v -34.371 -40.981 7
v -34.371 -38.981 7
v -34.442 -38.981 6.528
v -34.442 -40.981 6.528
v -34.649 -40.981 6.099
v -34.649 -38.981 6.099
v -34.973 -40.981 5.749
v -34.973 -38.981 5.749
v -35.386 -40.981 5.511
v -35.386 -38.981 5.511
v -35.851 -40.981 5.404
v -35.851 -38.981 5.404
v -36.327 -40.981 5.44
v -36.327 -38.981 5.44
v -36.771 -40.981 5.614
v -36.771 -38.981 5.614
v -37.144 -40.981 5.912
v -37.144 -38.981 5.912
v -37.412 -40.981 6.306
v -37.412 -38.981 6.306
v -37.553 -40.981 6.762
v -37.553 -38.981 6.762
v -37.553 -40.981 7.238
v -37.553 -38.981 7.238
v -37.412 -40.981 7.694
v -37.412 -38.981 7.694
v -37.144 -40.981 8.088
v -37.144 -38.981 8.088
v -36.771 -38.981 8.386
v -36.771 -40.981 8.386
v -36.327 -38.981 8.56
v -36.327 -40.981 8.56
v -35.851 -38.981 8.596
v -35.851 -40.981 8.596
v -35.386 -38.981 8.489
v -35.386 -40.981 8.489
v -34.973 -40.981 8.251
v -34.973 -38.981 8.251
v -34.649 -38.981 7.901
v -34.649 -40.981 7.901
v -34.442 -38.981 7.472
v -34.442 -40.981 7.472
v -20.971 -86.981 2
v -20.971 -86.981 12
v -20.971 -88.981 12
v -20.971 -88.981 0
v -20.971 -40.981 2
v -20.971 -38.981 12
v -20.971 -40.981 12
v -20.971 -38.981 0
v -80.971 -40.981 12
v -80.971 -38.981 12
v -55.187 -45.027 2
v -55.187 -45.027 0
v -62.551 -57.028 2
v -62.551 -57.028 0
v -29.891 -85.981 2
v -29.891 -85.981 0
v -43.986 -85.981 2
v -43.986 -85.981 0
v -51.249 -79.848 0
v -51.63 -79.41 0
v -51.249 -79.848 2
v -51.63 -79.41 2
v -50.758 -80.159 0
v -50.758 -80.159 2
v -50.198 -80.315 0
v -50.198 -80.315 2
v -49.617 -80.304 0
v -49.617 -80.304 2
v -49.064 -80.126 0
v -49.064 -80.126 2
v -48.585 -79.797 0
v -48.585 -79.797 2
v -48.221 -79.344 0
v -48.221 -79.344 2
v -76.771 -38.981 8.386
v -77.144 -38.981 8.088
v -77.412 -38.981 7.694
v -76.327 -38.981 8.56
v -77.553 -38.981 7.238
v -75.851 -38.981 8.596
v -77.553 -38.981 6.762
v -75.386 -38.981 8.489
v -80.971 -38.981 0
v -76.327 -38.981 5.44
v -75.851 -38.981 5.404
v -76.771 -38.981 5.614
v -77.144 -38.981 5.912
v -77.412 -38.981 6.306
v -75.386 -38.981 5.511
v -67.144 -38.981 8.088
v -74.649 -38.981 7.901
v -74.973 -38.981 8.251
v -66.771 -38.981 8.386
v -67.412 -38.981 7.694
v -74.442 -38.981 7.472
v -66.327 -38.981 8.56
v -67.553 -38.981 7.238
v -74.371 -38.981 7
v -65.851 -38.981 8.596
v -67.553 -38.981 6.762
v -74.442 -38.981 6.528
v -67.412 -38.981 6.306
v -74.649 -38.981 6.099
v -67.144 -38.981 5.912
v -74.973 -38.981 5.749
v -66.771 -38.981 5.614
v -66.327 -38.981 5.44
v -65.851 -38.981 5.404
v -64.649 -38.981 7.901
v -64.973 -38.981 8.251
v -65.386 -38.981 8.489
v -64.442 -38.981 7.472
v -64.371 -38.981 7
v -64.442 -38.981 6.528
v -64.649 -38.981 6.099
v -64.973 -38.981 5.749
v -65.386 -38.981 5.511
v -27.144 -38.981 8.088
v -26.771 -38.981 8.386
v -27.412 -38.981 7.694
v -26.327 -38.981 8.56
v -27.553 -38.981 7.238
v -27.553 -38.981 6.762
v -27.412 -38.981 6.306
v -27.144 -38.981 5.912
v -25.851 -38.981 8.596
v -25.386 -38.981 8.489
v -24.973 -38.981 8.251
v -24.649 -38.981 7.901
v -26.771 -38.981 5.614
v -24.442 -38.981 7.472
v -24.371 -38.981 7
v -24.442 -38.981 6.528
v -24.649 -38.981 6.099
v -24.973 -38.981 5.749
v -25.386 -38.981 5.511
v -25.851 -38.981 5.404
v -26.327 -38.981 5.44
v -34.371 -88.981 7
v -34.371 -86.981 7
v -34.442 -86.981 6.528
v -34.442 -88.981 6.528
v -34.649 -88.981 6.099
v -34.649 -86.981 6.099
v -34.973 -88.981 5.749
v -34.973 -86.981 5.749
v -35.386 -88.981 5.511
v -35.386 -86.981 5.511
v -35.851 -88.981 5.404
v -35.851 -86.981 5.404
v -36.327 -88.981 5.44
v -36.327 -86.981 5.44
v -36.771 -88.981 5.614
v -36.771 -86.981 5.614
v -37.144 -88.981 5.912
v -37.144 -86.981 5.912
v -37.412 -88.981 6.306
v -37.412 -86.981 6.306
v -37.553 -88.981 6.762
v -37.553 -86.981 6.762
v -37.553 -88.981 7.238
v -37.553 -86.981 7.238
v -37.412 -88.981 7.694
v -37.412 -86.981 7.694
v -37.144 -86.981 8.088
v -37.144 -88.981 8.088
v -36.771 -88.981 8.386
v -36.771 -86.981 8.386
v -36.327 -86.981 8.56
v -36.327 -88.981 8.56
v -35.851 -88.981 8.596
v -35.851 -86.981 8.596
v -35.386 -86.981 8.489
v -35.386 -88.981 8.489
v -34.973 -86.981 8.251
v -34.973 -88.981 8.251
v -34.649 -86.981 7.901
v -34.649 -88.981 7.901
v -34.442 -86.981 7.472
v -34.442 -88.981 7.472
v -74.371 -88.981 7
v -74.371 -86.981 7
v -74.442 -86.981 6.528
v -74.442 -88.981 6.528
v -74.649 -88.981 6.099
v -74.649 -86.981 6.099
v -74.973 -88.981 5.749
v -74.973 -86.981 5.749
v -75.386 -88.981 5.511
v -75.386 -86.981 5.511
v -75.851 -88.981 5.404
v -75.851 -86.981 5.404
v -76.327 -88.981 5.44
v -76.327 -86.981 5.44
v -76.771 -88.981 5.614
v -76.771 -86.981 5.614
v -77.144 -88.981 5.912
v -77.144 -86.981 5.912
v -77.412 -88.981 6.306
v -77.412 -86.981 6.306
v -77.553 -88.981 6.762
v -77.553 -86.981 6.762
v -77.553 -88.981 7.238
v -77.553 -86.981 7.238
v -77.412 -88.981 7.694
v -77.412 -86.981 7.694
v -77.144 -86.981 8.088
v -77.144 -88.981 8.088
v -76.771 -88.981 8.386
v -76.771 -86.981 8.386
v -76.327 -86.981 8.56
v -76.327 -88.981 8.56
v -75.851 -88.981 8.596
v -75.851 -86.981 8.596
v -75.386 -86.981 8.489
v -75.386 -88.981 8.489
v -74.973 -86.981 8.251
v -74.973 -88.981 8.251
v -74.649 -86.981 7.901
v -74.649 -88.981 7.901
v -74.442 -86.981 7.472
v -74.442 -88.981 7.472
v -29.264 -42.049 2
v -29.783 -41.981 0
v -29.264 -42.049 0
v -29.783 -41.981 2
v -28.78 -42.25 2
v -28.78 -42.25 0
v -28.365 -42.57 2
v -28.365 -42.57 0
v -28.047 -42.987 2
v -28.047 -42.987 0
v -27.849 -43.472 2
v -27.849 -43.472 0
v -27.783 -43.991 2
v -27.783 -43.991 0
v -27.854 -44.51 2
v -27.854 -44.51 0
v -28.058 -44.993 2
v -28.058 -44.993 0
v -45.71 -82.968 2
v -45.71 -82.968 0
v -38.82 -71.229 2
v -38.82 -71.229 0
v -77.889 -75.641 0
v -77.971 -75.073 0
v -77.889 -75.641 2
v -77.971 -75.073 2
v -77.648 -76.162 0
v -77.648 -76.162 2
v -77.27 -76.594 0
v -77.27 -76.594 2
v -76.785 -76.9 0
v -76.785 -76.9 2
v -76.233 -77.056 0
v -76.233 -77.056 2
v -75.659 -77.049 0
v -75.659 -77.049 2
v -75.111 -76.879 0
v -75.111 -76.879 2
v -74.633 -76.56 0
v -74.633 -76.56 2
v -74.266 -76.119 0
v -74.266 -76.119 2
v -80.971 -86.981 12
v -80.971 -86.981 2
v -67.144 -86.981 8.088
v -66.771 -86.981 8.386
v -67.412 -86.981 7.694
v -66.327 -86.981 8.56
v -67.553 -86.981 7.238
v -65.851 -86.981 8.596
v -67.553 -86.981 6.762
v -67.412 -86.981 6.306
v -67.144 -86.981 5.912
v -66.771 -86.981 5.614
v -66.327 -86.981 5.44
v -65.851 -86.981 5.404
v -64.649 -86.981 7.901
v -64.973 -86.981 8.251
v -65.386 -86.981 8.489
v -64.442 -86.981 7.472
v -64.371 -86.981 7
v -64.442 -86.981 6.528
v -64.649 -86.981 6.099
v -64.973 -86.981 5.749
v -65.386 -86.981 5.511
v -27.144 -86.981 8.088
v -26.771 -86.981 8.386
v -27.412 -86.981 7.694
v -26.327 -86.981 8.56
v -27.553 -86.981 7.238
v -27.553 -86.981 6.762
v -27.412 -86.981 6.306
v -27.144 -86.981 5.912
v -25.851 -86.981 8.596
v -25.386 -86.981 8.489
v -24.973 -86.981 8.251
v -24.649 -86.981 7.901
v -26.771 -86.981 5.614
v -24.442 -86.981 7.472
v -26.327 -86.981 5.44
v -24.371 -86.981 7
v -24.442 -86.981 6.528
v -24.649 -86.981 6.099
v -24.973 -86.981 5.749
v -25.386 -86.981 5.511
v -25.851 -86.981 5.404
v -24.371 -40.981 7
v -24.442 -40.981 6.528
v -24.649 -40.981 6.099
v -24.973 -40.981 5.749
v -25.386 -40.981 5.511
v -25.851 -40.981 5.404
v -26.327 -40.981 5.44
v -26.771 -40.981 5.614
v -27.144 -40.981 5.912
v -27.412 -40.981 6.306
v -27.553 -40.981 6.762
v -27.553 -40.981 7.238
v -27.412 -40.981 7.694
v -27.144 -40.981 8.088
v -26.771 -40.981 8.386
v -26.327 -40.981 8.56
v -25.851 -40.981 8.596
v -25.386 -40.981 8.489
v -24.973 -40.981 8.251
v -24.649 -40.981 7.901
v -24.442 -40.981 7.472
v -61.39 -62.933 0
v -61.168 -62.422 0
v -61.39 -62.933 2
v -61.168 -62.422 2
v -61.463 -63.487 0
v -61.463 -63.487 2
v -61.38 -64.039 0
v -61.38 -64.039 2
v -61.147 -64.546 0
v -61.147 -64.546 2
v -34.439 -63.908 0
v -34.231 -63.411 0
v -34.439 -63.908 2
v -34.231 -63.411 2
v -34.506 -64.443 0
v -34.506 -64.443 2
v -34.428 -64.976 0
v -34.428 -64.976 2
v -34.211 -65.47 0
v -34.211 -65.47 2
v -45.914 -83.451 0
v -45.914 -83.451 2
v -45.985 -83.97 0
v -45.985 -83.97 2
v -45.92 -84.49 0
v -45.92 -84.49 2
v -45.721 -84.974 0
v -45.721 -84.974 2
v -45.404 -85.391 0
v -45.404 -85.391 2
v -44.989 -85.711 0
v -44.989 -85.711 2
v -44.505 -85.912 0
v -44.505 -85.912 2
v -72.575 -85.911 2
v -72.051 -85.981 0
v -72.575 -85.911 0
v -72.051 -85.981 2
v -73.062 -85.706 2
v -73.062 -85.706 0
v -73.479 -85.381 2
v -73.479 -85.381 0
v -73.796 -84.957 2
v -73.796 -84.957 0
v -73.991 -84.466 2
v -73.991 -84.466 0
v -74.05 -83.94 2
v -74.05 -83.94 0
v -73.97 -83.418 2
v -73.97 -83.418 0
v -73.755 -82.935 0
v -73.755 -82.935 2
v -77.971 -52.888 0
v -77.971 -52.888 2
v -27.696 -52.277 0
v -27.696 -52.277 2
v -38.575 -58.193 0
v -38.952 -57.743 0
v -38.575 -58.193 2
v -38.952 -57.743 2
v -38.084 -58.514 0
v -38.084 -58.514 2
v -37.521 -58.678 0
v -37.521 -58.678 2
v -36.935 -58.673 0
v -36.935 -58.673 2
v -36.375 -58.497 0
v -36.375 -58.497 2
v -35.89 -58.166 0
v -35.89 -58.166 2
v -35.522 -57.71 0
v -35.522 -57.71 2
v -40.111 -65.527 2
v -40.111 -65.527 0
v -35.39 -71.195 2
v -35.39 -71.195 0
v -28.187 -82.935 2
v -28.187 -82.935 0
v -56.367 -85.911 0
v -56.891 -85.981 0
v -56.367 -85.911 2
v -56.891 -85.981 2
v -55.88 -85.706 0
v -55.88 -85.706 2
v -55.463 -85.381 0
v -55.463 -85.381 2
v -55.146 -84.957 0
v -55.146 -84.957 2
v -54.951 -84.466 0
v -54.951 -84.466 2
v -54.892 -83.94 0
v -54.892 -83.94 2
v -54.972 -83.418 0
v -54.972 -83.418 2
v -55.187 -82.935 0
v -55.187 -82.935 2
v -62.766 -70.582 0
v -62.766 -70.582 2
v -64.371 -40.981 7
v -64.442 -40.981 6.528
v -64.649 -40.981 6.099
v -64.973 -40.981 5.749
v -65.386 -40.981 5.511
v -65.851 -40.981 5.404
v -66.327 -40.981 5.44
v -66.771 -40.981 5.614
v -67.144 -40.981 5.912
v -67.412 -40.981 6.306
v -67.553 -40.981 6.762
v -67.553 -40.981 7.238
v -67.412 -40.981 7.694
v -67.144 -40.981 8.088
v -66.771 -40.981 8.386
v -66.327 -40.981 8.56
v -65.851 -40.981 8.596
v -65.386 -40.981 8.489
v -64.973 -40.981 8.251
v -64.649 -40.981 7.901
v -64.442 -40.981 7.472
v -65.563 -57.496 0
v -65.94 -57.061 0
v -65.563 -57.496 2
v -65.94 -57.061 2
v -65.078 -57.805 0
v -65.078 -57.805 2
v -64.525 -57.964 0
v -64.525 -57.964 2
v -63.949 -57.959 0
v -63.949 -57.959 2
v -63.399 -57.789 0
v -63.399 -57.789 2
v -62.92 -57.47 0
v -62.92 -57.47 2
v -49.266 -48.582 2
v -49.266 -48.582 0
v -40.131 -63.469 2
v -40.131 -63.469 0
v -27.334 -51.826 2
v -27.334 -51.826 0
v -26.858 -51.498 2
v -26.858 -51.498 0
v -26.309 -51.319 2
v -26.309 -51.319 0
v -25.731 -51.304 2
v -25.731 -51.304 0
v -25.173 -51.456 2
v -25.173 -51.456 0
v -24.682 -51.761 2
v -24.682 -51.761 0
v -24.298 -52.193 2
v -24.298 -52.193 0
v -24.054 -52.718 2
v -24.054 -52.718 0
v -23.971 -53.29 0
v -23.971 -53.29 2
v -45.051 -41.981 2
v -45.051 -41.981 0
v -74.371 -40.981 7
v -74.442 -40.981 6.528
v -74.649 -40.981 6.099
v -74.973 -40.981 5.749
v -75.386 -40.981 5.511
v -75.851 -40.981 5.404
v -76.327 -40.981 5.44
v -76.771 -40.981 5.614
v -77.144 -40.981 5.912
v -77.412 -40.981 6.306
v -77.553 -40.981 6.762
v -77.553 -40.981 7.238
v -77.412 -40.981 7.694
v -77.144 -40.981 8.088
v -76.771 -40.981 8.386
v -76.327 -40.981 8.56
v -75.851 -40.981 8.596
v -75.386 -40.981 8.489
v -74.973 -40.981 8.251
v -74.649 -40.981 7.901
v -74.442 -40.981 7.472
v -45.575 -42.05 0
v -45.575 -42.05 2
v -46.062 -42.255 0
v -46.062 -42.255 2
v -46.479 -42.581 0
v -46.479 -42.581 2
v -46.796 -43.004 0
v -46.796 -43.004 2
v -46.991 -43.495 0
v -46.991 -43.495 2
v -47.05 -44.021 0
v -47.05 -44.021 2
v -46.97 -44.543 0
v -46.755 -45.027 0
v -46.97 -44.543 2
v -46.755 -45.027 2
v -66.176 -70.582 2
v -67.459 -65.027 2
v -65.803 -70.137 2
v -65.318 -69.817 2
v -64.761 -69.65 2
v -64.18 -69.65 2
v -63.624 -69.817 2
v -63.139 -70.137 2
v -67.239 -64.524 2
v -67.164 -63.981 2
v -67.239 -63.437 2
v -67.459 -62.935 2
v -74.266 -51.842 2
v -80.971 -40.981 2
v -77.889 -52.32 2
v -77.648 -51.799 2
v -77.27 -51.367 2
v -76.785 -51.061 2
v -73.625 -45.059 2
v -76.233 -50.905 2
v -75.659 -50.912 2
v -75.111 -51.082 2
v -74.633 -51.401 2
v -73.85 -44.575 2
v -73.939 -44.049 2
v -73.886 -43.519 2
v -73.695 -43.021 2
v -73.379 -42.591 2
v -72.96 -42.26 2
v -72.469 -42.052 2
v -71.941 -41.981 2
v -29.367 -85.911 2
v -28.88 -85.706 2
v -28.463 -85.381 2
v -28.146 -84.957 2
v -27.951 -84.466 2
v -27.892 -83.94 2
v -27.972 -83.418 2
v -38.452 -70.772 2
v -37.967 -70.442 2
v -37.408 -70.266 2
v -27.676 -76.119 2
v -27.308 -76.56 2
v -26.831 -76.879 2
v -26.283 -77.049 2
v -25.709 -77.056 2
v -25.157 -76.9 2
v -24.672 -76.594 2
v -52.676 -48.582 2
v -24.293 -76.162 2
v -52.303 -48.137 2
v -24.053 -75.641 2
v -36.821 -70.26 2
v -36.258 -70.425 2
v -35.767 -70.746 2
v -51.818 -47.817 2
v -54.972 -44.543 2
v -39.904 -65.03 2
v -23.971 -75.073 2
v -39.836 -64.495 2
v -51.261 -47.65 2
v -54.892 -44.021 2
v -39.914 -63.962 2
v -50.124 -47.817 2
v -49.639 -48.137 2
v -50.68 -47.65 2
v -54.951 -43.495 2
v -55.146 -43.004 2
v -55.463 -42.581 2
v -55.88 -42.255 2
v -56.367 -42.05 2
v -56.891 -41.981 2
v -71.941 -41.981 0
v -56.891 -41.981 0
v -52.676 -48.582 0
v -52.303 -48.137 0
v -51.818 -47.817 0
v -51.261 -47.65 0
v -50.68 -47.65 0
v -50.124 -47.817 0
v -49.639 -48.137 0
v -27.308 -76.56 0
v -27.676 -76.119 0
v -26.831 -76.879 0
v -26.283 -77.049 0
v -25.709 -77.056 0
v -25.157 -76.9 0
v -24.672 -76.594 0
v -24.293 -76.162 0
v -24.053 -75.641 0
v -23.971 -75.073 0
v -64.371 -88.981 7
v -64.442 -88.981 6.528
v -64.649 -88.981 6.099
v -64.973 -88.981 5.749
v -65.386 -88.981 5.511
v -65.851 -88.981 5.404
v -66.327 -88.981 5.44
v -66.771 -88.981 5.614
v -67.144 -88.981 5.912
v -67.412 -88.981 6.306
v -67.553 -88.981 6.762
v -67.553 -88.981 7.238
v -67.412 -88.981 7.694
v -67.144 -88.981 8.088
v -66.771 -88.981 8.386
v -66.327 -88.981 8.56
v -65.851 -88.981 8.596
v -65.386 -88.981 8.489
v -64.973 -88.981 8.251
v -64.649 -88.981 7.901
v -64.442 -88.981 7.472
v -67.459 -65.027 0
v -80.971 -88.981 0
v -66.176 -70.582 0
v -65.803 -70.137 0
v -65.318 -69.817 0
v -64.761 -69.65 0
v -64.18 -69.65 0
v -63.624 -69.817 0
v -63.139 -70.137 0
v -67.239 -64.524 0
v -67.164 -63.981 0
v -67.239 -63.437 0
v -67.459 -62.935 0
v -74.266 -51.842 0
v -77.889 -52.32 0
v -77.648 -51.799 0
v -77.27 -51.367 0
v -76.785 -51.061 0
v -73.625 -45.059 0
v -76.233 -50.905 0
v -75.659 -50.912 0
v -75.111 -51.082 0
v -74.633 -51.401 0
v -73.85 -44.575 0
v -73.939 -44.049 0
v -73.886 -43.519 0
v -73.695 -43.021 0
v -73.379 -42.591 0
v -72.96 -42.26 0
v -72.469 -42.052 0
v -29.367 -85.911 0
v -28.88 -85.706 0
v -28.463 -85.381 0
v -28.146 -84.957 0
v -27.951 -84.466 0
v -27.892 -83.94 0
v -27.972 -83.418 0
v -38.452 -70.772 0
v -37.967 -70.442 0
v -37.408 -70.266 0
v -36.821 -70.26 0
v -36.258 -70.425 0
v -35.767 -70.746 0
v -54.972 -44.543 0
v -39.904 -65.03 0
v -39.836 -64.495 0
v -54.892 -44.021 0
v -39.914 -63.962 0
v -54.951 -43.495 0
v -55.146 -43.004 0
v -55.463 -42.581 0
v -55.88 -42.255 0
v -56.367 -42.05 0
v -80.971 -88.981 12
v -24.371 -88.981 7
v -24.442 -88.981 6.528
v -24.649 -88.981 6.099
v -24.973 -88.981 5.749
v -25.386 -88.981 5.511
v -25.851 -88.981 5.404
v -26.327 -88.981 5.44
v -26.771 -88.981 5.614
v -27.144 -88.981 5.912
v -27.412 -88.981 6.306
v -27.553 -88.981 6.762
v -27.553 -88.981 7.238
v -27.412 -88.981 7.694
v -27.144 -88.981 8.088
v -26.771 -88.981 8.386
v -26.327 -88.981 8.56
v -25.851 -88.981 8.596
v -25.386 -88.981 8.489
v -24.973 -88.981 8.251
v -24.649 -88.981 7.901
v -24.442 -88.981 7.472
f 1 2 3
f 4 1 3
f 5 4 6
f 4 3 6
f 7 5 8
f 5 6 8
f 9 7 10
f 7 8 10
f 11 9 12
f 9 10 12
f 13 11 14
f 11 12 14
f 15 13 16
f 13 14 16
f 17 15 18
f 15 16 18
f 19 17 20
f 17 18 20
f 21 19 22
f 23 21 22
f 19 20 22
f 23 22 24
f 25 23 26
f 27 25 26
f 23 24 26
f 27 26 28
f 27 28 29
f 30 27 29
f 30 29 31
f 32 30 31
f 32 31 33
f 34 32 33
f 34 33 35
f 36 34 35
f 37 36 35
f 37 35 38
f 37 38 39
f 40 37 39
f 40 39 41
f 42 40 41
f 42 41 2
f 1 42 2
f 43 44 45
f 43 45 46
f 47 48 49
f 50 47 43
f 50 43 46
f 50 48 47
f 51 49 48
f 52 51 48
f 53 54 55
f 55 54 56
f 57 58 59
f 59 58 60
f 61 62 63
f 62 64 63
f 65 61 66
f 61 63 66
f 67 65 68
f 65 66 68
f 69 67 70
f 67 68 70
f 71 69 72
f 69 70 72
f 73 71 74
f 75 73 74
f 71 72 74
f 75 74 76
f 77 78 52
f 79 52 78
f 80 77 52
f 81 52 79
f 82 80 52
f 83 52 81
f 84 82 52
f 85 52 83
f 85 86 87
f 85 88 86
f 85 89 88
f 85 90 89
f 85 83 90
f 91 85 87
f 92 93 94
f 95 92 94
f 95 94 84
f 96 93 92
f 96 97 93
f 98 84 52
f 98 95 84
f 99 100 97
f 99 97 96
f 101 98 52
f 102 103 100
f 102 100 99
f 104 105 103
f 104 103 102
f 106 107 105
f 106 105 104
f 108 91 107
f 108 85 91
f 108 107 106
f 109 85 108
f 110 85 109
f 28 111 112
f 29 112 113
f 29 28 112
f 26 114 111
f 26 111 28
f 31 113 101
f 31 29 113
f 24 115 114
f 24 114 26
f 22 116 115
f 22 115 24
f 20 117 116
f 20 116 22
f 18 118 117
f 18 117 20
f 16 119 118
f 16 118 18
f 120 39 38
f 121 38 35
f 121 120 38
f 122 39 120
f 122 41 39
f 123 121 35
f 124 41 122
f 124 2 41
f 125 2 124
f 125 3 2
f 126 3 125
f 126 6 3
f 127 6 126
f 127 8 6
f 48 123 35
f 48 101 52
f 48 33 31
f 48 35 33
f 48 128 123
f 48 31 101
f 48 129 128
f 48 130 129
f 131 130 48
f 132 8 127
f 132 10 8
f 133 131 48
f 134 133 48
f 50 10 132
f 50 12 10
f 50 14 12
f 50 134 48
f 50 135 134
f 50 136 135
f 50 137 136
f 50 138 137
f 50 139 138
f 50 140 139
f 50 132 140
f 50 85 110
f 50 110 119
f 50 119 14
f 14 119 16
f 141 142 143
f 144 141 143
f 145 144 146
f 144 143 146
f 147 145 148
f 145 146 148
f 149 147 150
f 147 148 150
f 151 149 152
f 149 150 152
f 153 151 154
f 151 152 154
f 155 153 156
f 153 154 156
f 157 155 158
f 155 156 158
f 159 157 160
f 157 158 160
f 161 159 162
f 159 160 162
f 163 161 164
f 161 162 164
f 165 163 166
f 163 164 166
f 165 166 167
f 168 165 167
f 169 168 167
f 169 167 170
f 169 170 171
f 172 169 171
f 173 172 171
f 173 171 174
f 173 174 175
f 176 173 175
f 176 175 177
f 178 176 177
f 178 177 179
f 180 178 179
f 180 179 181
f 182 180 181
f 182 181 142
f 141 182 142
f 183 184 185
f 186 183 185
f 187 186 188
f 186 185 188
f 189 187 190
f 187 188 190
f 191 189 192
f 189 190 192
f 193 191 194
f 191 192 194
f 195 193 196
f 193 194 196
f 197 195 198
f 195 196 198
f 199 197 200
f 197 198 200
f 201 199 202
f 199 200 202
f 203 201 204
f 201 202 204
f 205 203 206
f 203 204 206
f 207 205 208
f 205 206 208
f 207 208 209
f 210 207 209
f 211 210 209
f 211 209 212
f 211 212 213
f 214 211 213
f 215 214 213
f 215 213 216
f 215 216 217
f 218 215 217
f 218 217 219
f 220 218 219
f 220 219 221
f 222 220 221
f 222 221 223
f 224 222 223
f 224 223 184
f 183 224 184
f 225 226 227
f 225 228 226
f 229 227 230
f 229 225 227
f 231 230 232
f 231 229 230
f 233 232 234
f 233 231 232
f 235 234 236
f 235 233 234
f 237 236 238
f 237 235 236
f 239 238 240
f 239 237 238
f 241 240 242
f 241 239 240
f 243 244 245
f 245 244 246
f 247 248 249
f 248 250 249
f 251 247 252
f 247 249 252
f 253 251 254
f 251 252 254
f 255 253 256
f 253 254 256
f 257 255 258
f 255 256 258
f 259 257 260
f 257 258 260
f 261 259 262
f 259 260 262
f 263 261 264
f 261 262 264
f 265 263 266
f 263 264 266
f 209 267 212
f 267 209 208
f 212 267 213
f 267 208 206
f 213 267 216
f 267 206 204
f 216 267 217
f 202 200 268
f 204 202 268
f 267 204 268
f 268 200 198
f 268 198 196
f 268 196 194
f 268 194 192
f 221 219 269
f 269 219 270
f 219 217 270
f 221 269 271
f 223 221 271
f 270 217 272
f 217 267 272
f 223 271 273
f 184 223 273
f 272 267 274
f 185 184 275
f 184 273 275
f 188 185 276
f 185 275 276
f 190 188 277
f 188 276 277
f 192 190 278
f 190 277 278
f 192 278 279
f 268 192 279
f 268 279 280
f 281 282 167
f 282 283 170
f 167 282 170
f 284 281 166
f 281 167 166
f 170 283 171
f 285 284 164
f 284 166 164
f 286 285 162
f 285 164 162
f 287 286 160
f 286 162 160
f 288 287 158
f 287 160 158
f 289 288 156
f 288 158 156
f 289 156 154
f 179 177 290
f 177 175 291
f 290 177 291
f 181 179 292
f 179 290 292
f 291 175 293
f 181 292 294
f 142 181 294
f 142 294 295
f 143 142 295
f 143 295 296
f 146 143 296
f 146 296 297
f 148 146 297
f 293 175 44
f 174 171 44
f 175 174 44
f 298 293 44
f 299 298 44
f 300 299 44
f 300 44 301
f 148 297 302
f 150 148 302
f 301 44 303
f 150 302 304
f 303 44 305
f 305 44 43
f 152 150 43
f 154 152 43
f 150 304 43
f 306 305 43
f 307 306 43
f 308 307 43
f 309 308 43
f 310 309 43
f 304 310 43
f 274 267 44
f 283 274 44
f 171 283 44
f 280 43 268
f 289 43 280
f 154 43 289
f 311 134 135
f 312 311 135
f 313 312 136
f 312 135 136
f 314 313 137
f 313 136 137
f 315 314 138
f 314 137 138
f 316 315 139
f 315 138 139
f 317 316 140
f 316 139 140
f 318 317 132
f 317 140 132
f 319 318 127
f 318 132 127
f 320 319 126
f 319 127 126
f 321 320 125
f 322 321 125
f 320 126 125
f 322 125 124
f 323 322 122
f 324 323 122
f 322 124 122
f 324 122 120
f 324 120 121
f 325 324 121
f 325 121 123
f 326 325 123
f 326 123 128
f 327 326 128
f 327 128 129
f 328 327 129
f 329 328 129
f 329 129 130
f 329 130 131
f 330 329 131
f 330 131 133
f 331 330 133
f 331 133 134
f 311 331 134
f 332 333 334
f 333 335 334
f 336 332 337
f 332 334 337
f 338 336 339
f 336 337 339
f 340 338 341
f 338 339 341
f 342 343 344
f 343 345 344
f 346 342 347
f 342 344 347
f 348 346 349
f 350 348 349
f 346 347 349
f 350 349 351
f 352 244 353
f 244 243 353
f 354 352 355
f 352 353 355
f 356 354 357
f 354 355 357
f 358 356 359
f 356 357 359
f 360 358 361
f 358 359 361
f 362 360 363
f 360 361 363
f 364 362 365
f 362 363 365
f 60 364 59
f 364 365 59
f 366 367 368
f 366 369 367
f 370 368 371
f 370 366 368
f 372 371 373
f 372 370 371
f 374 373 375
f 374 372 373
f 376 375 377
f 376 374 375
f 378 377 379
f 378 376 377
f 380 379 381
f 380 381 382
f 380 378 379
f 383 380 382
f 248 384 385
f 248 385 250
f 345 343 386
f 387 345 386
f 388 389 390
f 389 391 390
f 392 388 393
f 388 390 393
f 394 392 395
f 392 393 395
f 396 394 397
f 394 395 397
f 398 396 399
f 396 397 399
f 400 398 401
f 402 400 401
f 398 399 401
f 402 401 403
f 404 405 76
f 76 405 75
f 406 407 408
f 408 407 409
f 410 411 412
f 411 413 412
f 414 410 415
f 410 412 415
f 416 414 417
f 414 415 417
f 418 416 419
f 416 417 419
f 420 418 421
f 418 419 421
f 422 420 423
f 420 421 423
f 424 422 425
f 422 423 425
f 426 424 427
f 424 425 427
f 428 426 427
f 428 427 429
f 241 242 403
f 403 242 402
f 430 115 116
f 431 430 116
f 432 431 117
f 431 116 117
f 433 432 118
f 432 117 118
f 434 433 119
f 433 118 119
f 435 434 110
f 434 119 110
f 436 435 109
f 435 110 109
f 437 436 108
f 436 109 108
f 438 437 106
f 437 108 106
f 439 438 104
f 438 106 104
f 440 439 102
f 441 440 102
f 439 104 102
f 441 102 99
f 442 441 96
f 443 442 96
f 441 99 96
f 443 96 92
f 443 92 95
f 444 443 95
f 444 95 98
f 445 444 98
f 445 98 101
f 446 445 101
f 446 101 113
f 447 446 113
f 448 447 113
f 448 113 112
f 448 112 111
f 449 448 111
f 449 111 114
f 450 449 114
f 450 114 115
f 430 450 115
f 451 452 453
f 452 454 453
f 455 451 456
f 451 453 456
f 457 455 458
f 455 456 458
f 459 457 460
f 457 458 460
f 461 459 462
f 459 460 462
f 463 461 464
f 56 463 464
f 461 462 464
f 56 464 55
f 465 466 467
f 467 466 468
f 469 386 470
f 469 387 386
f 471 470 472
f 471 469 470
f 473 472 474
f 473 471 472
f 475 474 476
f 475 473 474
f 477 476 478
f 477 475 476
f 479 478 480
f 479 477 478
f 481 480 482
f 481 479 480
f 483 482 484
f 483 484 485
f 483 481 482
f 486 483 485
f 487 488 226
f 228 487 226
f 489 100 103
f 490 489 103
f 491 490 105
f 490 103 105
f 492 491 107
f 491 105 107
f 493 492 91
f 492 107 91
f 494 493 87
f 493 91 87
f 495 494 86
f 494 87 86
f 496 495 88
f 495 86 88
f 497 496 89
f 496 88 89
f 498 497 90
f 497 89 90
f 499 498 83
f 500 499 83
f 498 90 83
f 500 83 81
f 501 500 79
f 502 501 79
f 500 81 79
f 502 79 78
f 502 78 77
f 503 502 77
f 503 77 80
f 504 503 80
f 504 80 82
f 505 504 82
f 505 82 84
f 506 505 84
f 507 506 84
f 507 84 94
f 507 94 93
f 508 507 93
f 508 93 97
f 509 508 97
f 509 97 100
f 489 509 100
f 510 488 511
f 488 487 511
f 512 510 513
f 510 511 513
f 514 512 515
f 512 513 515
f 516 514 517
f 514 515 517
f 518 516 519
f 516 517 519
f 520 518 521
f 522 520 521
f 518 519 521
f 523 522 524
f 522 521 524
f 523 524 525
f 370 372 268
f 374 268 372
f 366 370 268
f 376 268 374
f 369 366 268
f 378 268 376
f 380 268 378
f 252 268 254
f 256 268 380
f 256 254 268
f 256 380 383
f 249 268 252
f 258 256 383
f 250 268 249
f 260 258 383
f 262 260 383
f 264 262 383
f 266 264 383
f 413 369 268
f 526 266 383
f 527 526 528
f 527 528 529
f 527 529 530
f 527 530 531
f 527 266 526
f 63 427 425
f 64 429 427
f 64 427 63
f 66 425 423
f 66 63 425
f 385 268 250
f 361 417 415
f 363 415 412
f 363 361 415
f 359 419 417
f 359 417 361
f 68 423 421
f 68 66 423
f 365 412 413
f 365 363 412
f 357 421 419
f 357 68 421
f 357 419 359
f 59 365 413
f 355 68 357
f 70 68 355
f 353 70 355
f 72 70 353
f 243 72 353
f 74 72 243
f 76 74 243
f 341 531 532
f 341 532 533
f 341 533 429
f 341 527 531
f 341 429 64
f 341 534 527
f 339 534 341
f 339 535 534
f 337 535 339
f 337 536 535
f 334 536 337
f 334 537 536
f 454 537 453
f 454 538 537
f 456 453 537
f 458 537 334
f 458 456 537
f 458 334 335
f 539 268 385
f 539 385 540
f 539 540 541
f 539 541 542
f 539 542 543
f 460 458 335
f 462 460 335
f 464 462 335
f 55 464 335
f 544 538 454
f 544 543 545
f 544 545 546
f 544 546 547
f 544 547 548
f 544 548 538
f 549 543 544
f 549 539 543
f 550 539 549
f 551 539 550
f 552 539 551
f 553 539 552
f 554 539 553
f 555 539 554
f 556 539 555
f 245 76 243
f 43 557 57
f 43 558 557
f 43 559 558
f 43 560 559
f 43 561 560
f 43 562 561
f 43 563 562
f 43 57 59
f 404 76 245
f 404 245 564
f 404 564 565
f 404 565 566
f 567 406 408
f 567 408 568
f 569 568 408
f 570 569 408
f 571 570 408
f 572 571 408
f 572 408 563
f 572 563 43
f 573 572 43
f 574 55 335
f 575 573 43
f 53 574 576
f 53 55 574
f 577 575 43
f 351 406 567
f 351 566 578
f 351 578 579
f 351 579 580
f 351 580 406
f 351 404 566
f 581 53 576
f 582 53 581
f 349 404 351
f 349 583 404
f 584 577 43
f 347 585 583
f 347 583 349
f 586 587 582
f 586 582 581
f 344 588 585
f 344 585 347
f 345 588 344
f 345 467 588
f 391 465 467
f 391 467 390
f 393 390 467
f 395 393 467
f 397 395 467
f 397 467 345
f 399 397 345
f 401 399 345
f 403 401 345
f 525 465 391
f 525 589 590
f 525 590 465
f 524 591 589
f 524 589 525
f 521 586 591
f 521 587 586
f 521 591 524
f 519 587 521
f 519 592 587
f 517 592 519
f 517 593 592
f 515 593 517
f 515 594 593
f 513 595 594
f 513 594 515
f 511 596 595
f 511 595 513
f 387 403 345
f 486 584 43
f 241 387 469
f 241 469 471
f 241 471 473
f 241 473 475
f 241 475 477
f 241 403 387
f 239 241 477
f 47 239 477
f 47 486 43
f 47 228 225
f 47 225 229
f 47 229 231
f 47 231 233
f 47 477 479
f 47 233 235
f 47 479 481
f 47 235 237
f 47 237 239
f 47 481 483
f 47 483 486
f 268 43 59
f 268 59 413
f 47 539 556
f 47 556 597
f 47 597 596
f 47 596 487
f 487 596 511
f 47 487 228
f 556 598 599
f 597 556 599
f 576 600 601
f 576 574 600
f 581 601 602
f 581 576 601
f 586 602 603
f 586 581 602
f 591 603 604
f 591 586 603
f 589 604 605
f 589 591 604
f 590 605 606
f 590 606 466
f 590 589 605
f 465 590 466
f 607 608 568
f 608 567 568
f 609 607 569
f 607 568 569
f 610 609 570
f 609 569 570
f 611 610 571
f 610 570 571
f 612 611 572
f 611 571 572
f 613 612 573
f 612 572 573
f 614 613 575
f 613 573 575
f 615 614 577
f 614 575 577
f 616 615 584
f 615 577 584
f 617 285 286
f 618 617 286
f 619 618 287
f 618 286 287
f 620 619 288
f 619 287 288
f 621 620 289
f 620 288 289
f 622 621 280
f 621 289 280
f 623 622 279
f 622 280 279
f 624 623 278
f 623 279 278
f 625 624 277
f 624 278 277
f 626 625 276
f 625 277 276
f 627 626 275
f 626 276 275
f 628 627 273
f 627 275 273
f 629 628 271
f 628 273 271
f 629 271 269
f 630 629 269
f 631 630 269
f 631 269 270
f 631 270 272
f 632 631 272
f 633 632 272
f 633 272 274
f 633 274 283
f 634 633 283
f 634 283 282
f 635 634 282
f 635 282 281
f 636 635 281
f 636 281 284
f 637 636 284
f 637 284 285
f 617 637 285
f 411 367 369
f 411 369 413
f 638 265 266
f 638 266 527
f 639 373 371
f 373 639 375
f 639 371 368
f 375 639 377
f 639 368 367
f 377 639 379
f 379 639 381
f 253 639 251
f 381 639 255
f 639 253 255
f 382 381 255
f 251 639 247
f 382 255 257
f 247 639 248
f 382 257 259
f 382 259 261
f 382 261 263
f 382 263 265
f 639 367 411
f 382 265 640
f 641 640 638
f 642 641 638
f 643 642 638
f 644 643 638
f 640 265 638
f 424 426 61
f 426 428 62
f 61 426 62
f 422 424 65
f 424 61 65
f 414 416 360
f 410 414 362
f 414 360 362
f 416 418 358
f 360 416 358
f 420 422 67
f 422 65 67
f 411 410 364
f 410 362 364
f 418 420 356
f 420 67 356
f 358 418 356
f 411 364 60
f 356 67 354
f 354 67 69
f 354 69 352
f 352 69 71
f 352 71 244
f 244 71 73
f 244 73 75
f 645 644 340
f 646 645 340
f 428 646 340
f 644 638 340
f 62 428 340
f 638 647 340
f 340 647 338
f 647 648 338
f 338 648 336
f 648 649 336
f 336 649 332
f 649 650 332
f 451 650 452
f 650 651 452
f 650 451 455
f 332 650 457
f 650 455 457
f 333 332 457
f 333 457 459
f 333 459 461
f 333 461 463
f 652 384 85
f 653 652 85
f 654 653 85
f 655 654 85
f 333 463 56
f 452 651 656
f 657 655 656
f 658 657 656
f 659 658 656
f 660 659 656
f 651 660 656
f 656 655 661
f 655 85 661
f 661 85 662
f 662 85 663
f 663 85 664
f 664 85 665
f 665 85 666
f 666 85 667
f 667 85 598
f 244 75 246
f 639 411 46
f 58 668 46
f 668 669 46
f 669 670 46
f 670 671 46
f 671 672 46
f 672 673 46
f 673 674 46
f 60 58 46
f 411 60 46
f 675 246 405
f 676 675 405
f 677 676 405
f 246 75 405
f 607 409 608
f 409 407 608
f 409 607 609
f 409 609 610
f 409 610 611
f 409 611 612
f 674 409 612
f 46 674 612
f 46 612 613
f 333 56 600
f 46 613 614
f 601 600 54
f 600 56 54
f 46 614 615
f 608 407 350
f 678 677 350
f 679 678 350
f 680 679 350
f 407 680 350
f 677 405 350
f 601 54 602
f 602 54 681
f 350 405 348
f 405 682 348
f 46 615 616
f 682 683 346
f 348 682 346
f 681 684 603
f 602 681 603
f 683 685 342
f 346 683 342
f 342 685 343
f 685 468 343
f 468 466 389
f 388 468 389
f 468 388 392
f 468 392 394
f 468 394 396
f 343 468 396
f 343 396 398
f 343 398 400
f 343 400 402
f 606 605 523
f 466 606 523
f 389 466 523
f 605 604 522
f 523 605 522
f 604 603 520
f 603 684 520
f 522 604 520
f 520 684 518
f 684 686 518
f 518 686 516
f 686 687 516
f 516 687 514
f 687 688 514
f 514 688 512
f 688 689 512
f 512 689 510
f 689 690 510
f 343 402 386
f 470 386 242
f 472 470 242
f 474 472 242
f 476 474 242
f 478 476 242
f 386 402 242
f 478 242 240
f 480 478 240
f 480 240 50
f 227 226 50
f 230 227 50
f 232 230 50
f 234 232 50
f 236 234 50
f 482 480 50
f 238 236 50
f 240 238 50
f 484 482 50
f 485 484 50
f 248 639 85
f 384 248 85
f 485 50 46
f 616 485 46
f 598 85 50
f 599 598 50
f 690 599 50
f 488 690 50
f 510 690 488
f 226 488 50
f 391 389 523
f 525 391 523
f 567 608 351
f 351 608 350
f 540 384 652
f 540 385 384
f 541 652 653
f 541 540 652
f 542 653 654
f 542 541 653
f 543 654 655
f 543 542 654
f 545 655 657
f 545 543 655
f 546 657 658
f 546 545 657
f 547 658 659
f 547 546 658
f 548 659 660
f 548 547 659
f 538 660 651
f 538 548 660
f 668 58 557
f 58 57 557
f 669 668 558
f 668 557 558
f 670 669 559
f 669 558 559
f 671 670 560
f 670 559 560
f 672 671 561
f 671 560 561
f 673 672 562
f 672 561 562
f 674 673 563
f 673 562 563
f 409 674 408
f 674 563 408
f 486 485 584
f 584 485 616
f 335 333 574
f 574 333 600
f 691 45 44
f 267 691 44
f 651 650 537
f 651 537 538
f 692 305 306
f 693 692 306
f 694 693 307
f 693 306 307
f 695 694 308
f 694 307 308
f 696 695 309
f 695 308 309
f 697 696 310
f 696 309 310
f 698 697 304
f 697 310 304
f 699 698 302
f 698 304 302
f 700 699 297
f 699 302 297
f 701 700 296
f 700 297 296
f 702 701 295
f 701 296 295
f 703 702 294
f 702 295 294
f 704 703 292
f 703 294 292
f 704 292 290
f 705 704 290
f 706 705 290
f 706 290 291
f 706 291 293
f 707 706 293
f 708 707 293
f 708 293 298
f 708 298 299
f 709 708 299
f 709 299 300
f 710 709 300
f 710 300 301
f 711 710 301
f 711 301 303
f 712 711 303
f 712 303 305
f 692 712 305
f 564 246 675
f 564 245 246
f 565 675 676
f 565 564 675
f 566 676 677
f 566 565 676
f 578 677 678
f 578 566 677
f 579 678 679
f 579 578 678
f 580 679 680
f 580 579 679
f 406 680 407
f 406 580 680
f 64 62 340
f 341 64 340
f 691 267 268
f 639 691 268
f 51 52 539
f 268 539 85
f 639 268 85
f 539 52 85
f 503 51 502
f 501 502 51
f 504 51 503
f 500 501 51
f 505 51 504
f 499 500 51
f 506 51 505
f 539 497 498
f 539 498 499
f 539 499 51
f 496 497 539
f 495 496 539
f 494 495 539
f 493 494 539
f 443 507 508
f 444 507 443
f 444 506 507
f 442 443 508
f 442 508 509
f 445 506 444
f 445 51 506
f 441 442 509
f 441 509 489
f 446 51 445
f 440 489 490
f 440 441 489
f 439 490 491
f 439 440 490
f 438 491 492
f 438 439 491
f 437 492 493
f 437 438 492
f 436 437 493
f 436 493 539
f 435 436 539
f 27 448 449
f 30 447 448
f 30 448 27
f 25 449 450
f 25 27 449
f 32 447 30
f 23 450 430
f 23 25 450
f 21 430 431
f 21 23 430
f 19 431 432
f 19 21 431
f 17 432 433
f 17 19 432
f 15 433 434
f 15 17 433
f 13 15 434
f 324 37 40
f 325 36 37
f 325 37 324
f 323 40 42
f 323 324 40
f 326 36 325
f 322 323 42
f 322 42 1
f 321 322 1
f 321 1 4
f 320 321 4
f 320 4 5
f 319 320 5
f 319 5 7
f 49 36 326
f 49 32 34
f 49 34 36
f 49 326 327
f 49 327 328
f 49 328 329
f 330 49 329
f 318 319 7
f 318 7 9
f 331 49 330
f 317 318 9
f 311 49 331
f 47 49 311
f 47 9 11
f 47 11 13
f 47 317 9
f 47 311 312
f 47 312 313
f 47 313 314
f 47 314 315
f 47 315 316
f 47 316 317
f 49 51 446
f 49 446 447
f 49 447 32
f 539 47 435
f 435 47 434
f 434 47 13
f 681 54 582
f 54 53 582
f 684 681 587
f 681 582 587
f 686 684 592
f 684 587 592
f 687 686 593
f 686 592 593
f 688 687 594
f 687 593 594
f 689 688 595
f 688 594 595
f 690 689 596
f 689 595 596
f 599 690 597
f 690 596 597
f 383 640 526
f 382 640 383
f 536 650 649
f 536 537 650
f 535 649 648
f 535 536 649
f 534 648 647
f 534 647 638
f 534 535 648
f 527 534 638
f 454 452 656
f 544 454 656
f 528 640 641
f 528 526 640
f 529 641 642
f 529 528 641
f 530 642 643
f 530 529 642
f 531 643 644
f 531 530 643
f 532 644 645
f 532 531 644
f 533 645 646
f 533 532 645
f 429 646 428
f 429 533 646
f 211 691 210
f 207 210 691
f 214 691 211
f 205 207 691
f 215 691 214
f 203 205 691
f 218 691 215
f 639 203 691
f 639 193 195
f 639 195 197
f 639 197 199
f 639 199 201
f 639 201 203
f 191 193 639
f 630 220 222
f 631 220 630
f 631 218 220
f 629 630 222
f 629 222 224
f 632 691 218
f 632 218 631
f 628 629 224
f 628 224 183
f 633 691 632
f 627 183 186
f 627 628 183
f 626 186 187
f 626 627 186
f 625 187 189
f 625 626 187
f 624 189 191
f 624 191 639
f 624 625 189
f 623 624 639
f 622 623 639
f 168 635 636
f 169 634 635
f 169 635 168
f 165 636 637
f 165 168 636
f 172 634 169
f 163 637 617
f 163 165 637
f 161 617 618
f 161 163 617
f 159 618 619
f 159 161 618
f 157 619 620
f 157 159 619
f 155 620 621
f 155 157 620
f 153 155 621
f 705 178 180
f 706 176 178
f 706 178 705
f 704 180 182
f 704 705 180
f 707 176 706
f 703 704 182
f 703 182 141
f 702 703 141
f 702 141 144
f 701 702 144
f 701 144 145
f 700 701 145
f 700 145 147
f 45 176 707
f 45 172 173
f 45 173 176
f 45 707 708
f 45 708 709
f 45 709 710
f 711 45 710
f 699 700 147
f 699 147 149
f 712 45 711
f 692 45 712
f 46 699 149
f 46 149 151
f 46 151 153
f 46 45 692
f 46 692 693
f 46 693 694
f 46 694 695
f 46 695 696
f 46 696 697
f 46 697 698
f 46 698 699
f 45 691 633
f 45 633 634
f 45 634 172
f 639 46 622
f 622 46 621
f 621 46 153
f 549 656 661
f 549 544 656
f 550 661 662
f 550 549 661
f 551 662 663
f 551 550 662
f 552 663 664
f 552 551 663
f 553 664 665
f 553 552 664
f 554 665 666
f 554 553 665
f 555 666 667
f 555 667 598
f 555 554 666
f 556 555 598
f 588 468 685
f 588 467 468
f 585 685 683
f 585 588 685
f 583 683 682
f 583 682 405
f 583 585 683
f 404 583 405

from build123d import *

# Parameters (mm, degrees)
SKETCH_1_W          = 60
SKETCH_1_H          = 50
EXTRUDE_1_DEPTH     = 2
SKETCH_2_W          = 10
SKETCH_2_H          = 2
EXTRUDE_2_DEPTH     = 60
SKETCH_3_R          = 1.6
CUT_EXTRUDE_1_DEPTH = 51
FILLET_1_R          = 2


with BuildPart() as part:
    # 草图1 → 凸台-拉伸1 (new body)
    with BuildSketch(Plane.XY):
        with Locations((-50.970873786, -63.980582524)):
            Rectangle(SKETCH_1_W, SKETCH_1_H)
        Polygon((-77.970873786, -45.804555709), (-77.970873786, -82.156609339), (-66.817402786, -63.980582524), align=None, mode=Mode.SUBTRACT)
        Polygon((-75.624344787, -85.980582524), (-53.317402786, -85.980582524), (-64.470873786, -67.804555709), align=None, mode=Mode.SUBTRACT)
        Polygon((-23.970873786, -45.9315118), (-23.970873786, -82.156609339), (-34.838542531, -64.446334348), align=None, mode=Mode.SUBTRACT)
        Polygon((-75.596017187, -41.980582524), (-53.317402786, -41.980582524), (-64.219831603, -59.747503559), align=None, mode=Mode.SUBTRACT)
        Polygon((-50.970873786, -45.804555709), (-39.503543881, -64.492056295), (-49.871707725, -82.155891862), (-61.82340345, -63.490159606), align=None, mode=Mode.SUBTRACT)
        Polygon((-26.289955727, -41.980582524), (-37.209130522, -60.583153918), (-48.624344787, -41.980582524), align=None, mode=Mode.SUBTRACT)
        Polygon((-37.13295589, -68.355236725), (-26.317402786, -85.980582524), (-47.478527346, -85.980582524), align=None, mode=Mode.SUBTRACT)
    extrude(amount=EXTRUDE_1_DEPTH)

    # 草图2 → 凸台-拉伸2 (add)
    with BuildSketch(Plane(origin=(-20.970873786, 0, 0), x_dir=(0, 0, -1), z_dir=(1, 0, 0))):
        with Locations((-7, -87.980582524)):
            Rectangle(SKETCH_2_W, SKETCH_2_H)
        with Locations((-7, -39.980582524)):
            Rectangle(SKETCH_2_W, SKETCH_2_H)
    extrude(amount=-EXTRUDE_2_DEPTH)

    # 草图3 → 切除-拉伸1 (cut, through all)
    with BuildSketch(Plane(origin=(0, -38.980582524, 0), x_dir=(1, 0, 0), z_dir=(0, 1, 0))):
        with Locations((-75.970873786, -7)):
            Circle(SKETCH_3_R)
        with Locations((-65.970873786, -7)):
            Circle(SKETCH_3_R)
        with Locations((-35.970873786, -7)):
            Circle(SKETCH_3_R)
        with Locations((-25.970873786, -7)):
            Circle(SKETCH_3_R)
    extrude(amount=-CUT_EXTRUDE_1_DEPTH, mode=Mode.SUBTRACT)

    # 圆角1
    fillet_1_edges = [part.edges().sort_by_distance(p)[0] for p in [
        (-50.970873786, -45.804555709, 1),
        (-61.82340345, -63.490159606, 1),
        (-49.871707725, -82.155891862, 1),
        (-39.503543881, -64.492056295, 1),
        (-66.817402786, -63.980582524, 1),
        (-77.970873786, -45.804555709, 1),
        (-77.970873786, -82.156609339, 1),
        (-75.596017187, -41.980582524, 1),
        (-64.219831603, -59.747503559, 1),
        (-53.317402786, -41.980582524, 1),
        (-26.289955727, -41.980582524, 1),
        (-48.624344787, -41.980582524, 1),
        (-37.209130522, -60.583153918, 1),
        (-23.970873786, -45.9315118, 1),
        (-34.838542531, -64.446334348, 1),
        (-23.970873786, -82.156609339, 1),
        (-64.470873786, -67.804555709, 1),
        (-75.624344787, -85.980582524, 1),
        (-53.317402786, -85.980582524, 1),
        (-47.478527346, -85.980582524, 1),
        (-26.317402786, -85.980582524, 1),
        (-37.13295589, -68.355236725, 1),
    ]]
    fillet(fillet_1_edges, radius=FILLET_1_R)


solid = part.part
